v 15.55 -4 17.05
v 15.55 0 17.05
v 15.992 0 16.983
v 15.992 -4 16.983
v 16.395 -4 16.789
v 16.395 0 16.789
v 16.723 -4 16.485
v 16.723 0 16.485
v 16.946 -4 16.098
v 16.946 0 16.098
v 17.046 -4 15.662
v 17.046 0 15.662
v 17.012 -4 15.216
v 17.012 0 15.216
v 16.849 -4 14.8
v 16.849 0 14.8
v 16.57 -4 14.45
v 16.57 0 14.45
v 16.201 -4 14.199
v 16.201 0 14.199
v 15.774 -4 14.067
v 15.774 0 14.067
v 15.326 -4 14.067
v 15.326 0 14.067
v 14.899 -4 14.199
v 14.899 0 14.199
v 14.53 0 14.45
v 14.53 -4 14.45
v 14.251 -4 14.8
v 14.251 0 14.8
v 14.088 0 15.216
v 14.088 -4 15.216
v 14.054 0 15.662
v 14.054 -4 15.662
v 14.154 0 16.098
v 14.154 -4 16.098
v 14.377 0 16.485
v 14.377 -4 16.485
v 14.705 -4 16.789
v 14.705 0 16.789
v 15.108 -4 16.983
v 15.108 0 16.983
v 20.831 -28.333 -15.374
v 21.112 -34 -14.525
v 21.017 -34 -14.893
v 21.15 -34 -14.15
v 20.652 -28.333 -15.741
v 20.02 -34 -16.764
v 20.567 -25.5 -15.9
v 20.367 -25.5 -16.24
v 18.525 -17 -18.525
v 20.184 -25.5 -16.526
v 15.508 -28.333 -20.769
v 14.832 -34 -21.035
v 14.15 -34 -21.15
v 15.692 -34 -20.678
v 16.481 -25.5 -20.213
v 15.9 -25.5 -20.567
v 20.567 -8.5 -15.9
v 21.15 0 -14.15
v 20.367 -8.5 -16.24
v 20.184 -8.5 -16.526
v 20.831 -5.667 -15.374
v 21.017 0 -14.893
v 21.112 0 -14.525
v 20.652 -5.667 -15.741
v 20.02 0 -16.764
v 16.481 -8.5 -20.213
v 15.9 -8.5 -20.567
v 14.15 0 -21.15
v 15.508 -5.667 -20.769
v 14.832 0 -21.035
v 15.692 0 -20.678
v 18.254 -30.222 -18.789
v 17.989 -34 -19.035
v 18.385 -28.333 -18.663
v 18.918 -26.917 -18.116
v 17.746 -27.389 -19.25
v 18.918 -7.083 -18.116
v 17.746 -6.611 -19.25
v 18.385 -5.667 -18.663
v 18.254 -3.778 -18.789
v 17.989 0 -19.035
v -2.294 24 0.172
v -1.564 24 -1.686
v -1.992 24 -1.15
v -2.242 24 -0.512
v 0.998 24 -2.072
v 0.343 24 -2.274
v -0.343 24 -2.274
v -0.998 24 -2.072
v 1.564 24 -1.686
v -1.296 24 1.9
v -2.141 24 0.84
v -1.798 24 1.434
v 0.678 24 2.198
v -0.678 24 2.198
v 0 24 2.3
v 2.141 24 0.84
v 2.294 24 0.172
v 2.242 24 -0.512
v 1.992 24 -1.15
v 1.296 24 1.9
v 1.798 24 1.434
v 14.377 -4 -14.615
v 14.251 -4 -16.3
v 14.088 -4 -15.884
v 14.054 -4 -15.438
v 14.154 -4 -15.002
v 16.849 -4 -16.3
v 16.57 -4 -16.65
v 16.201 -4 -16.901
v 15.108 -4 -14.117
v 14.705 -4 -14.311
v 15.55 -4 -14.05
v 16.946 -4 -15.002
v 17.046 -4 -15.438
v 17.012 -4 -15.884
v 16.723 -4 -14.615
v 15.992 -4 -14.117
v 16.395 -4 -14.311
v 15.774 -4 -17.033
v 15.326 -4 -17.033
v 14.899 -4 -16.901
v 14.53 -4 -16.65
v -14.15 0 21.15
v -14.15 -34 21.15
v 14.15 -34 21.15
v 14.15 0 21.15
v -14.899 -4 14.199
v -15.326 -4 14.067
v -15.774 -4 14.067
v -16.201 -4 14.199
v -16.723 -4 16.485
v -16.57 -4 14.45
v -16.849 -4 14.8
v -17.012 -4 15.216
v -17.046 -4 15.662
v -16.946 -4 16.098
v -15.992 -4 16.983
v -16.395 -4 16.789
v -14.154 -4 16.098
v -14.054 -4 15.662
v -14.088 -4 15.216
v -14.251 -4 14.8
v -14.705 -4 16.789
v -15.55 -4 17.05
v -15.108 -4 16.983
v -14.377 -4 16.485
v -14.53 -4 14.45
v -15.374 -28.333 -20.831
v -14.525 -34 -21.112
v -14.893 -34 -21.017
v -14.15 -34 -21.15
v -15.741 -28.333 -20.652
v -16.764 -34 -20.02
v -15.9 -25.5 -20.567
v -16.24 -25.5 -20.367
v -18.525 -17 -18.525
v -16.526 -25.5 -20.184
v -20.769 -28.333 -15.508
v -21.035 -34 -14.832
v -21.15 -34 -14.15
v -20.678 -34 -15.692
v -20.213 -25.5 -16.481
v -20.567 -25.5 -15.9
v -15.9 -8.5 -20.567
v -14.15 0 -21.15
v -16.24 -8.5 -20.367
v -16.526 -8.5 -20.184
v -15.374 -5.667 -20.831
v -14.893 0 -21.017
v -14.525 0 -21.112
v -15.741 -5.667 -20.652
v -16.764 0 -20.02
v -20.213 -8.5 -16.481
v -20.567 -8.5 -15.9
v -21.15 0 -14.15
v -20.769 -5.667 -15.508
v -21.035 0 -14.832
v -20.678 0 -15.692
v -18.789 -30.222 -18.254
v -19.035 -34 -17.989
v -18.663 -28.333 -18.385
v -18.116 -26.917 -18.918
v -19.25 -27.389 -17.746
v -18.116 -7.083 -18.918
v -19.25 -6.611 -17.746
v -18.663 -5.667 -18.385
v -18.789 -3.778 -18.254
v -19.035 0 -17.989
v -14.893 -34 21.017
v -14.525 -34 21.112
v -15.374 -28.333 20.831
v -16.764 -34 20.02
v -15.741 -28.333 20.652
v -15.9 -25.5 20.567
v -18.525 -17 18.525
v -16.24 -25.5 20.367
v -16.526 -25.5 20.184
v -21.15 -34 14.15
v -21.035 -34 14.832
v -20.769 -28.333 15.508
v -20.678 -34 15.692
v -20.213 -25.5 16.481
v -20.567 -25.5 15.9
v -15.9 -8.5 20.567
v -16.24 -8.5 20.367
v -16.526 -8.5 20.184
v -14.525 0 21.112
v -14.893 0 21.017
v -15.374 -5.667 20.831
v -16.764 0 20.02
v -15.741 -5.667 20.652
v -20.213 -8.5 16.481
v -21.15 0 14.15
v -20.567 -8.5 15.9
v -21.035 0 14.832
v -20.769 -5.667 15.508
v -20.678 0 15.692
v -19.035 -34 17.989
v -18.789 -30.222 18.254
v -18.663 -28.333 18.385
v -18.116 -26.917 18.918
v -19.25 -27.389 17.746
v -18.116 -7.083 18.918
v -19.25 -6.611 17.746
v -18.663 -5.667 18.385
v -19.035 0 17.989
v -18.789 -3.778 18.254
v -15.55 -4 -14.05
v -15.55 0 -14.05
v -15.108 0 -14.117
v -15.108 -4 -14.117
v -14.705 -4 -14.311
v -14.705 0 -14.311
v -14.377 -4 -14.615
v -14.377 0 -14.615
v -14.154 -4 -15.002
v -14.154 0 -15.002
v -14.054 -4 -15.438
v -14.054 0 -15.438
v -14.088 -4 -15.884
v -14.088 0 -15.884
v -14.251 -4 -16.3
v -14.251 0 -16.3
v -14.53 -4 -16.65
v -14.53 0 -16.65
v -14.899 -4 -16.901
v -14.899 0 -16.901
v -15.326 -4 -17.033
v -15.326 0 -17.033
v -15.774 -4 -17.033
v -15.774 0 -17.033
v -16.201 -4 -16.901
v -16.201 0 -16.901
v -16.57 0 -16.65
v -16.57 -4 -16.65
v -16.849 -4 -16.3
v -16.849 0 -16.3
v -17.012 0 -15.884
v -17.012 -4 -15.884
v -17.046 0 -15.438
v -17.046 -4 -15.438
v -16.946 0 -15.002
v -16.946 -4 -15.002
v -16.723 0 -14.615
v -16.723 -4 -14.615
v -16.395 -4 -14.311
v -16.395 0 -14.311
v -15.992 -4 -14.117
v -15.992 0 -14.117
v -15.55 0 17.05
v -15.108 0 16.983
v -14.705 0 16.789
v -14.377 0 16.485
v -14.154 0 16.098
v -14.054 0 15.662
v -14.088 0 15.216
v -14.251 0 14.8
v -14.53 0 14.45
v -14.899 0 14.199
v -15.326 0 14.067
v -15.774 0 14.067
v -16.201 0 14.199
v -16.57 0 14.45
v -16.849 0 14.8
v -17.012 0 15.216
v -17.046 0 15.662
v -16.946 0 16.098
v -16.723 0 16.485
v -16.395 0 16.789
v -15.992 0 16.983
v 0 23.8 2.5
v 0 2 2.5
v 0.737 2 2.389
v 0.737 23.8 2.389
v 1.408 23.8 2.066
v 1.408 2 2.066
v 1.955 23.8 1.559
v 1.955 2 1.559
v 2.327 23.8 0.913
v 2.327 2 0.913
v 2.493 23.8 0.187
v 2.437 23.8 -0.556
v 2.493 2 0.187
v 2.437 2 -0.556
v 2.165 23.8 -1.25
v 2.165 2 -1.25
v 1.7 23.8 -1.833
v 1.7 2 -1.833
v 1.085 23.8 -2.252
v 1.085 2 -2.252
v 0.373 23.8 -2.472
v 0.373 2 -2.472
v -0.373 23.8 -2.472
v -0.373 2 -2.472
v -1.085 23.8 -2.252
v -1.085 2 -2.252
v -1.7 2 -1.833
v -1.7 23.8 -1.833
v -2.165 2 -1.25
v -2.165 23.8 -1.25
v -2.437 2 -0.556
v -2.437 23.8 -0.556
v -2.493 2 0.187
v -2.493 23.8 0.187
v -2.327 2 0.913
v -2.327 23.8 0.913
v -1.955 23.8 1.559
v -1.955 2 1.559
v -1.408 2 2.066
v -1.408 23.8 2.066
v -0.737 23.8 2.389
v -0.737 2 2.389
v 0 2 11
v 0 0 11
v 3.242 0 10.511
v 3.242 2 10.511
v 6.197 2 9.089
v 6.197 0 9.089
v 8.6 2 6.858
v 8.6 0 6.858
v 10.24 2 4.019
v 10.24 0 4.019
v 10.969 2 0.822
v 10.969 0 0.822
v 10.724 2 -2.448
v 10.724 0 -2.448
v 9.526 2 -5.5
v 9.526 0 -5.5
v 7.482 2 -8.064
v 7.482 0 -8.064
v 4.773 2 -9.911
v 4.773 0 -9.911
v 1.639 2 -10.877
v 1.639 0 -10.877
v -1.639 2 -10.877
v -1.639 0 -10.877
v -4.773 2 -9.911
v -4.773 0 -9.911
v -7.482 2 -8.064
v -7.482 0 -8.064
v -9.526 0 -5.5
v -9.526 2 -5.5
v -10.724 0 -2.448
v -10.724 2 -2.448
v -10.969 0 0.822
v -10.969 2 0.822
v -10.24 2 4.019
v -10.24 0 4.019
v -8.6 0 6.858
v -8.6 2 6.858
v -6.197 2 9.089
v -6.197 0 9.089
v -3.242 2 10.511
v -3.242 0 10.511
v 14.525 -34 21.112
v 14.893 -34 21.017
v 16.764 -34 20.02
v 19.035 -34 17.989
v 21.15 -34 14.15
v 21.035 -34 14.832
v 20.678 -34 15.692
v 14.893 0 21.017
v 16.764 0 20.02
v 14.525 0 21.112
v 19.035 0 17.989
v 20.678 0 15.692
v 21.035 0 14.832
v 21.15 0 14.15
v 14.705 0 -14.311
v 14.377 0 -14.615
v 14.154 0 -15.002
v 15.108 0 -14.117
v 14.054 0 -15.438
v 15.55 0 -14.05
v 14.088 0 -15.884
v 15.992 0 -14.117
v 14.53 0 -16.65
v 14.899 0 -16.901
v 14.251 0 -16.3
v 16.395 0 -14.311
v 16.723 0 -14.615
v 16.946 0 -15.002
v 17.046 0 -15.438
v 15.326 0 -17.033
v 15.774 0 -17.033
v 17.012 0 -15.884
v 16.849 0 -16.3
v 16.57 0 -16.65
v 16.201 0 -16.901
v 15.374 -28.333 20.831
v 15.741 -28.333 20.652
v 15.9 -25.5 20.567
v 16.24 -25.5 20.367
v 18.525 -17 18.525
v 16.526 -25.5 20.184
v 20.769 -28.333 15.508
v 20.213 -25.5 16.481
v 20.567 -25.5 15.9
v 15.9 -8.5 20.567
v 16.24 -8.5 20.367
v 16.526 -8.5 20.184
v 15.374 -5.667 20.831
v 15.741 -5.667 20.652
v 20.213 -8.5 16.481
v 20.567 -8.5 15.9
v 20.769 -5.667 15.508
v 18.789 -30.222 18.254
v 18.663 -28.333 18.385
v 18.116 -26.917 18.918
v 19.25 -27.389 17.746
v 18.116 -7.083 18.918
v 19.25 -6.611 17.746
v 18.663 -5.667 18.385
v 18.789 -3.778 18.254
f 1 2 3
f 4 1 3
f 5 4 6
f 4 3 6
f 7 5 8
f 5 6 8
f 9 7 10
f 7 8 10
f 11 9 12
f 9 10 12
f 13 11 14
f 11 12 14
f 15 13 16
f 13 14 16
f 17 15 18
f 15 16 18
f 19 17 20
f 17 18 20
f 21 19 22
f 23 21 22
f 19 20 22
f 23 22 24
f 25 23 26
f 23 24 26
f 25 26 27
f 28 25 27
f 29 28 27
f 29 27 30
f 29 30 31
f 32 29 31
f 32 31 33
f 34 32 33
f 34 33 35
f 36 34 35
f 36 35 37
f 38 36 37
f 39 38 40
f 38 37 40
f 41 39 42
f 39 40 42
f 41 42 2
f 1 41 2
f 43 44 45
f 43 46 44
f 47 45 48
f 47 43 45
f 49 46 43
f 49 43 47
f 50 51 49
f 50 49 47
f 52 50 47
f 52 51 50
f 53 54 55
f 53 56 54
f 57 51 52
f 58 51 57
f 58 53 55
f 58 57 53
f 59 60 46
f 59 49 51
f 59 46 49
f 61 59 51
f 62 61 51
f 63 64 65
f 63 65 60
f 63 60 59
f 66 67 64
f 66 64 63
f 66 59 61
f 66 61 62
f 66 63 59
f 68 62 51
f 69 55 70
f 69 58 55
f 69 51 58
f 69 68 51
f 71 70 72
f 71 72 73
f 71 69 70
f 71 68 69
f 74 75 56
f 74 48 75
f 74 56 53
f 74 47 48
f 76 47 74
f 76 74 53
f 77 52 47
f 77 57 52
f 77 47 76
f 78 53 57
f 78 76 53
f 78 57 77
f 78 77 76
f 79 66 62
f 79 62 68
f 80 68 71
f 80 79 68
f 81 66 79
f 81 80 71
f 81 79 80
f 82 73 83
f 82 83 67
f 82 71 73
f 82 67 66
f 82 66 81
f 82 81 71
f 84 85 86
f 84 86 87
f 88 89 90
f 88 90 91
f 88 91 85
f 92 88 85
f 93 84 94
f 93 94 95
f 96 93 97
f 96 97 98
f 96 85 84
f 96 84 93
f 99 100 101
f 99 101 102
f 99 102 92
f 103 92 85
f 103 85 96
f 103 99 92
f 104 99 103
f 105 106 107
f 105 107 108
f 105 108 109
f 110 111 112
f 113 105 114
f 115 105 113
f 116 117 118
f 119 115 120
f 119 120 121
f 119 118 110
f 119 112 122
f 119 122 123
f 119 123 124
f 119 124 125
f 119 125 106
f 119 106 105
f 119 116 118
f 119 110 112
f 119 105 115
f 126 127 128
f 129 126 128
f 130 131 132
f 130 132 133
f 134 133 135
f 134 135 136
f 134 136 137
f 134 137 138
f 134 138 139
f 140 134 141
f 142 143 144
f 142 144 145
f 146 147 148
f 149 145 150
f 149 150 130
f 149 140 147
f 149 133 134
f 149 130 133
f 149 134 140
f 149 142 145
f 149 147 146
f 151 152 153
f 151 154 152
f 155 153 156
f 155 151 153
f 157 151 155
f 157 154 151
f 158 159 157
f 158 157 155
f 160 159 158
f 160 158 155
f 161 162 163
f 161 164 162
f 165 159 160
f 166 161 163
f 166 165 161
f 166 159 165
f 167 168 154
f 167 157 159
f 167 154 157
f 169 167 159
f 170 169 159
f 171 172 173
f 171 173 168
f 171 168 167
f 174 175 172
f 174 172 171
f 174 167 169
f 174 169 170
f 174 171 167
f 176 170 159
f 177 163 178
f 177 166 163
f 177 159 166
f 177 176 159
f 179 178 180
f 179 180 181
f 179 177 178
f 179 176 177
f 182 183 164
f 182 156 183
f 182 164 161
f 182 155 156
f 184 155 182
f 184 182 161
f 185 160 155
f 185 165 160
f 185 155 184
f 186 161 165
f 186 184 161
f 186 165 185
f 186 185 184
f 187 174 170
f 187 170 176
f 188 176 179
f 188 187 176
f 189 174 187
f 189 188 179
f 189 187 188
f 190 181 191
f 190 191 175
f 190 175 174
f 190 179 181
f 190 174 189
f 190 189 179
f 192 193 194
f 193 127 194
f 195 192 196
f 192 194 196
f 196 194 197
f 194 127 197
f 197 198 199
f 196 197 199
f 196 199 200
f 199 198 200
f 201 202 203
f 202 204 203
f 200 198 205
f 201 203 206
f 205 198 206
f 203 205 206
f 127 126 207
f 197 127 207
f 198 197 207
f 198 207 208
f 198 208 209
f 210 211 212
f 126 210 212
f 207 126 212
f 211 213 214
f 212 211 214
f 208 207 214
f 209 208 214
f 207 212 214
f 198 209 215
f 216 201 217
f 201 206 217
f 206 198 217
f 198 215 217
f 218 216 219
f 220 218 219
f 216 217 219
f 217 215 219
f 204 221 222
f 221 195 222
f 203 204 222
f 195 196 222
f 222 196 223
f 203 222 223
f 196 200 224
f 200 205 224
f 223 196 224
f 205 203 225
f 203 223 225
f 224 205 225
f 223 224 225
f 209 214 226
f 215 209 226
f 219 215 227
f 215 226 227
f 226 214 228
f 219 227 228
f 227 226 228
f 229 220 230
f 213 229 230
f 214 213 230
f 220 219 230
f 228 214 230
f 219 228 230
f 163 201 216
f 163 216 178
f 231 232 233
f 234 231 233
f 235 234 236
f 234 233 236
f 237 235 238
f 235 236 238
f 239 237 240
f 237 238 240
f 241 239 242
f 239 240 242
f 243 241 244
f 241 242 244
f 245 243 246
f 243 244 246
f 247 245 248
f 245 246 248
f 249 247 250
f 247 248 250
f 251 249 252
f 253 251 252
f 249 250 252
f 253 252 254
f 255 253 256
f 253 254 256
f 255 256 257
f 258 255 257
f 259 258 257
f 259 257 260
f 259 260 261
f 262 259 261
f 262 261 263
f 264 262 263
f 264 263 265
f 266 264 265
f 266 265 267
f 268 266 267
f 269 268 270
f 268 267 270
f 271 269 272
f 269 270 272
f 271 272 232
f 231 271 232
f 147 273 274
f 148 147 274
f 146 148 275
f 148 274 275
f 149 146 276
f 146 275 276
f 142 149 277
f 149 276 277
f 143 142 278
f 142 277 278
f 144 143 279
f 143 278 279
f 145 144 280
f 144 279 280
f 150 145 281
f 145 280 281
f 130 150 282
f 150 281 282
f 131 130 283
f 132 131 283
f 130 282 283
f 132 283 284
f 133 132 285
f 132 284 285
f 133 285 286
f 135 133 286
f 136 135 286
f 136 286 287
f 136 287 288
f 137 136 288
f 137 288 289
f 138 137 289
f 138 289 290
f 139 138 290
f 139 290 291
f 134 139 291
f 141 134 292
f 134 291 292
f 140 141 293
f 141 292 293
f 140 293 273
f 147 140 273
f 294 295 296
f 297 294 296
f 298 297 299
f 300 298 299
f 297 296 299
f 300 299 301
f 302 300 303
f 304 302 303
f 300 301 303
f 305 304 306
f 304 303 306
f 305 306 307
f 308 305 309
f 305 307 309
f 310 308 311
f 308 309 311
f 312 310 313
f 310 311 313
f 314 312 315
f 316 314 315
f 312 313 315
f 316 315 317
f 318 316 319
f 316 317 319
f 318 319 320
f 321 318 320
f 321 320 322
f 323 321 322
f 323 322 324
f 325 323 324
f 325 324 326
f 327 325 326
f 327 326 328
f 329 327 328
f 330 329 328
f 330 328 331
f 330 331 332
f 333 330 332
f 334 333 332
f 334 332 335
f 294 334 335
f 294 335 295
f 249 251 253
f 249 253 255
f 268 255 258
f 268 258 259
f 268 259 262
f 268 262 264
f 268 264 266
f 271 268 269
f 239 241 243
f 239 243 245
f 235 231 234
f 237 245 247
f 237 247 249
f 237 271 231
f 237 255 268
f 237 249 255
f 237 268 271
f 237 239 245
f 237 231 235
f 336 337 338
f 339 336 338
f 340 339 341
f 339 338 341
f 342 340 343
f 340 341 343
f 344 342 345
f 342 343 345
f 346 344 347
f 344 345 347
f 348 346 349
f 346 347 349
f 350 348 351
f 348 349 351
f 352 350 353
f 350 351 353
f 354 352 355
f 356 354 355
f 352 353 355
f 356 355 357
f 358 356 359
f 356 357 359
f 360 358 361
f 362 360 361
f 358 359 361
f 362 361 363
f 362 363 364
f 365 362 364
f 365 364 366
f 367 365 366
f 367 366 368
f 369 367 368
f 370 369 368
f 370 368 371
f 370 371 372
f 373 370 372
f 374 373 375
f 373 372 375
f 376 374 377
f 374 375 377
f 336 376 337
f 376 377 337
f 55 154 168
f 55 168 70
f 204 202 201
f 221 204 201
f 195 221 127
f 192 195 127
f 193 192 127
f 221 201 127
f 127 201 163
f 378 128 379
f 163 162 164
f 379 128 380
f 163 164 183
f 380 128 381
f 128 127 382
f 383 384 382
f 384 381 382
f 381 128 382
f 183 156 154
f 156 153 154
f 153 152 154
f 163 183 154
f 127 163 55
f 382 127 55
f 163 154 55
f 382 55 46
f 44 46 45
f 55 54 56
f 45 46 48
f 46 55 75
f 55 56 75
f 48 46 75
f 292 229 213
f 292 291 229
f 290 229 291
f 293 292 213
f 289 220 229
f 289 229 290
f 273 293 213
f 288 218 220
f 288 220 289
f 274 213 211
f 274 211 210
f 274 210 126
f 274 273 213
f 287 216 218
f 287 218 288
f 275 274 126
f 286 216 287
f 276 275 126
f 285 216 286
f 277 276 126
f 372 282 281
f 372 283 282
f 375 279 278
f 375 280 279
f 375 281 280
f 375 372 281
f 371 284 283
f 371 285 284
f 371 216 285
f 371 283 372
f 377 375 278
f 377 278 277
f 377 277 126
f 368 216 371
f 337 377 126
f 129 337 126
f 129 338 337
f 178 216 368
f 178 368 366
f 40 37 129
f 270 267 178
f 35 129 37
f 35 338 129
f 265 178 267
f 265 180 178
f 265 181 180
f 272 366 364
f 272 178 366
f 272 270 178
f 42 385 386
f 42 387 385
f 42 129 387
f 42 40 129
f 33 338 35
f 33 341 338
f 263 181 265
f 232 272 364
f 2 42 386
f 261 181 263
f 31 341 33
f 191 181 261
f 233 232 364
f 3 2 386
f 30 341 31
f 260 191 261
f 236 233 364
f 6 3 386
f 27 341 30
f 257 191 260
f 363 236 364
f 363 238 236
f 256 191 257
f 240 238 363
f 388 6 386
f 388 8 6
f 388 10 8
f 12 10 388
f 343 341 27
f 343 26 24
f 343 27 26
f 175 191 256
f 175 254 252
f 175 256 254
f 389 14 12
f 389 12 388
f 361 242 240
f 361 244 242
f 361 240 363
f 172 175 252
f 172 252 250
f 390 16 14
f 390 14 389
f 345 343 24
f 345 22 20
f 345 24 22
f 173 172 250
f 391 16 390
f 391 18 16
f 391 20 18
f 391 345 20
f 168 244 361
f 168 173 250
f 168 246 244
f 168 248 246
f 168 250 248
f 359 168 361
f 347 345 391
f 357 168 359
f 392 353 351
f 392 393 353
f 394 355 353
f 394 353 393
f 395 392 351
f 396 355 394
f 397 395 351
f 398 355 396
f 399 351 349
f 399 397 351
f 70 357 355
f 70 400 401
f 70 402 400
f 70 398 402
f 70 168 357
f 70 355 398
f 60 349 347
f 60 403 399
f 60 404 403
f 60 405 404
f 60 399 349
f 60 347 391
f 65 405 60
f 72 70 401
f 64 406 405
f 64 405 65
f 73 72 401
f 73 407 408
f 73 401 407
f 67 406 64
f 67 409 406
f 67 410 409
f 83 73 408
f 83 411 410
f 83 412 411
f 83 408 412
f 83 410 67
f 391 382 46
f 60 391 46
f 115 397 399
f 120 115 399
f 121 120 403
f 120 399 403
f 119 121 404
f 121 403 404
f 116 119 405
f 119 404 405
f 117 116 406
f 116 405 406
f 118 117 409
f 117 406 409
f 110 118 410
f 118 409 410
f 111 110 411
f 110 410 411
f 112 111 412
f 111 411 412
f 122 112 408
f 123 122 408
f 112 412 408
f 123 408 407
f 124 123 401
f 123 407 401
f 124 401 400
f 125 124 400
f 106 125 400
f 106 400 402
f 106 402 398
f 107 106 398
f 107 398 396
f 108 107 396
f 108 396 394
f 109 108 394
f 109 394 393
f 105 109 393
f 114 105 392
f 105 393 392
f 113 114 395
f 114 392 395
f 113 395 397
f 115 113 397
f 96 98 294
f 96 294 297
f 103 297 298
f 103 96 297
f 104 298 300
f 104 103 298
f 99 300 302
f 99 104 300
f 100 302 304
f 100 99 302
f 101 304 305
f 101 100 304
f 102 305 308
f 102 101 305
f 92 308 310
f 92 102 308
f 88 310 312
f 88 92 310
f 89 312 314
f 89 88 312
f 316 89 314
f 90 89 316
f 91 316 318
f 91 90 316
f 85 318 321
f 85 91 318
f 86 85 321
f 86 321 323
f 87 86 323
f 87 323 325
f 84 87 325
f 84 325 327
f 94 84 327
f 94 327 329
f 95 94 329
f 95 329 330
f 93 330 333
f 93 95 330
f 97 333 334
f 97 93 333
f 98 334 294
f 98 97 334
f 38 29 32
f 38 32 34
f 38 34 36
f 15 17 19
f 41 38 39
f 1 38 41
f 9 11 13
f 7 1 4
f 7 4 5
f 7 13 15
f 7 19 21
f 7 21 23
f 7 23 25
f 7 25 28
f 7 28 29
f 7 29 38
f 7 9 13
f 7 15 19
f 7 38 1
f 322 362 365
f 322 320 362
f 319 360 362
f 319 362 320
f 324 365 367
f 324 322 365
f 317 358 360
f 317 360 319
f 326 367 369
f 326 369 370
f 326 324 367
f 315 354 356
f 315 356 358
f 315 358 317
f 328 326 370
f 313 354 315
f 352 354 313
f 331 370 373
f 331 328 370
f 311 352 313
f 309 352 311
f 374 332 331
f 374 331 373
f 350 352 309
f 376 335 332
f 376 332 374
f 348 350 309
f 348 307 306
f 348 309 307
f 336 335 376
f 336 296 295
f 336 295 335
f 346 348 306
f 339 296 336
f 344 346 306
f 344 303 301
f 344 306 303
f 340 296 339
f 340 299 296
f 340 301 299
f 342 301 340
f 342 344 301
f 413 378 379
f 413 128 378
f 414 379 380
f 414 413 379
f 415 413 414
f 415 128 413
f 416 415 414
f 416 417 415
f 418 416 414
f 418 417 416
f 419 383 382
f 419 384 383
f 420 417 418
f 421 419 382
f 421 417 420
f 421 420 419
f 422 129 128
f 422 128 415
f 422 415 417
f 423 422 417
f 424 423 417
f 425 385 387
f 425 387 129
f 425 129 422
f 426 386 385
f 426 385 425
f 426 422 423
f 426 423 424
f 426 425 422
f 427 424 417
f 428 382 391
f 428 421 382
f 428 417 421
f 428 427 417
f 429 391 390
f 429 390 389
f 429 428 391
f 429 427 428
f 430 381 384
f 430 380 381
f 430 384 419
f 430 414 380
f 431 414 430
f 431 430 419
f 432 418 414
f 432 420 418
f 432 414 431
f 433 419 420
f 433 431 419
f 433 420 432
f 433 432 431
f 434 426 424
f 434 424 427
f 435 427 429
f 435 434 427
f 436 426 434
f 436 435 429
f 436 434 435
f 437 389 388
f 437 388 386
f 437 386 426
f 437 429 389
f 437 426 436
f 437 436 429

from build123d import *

# Parameters (mm, degrees)
SKETCH1_W           = 42.3
SKETCH1_H           = 42.3
BOSS_EXTRUDE1_DEPTH = 34
FILLET1_SIZE        = 7
SKETCH1_3_R         = 1.5
CUT_EXTRUDE1_DEPTH  = 4
SKETCH3_R           = 11
SKETCH3_R_2         = 2.5
BOSS_EXTRUDE2_DEPTH = 2
SKETCH3_2_R         = 2.5
BOSS_EXTRUDE3_DEPTH = 24
CHAMFER1_SIZE       = 0.2


with BuildPart() as part:
    # Sketch1 → Boss-Extrude1 (new body)
    with BuildSketch(Plane(origin=(0, 0, 0), x_dir=(1, 0, 0), z_dir=(0, 1, 0))):
        Rectangle(SKETCH1_W, SKETCH1_H)
    extrude(amount=-BOSS_EXTRUDE1_DEPTH)

    # Fillet1
    # a fillet whose section is not a circle: 7 mm, written as the material it takes off along each edge
    with BuildSketch(Plane(origin=(21.15, 17.5, 21.15), x_dir=(-1, 0, 0), z_dir=(0, -1, 0)), Plane(origin=(21.15, 17.5, -21.15), x_dir=(0, 0, 1), z_dir=(0, -1, 0)), Plane(origin=(-21.15, 17.5, -21.15), x_dir=(1, 0, 0), z_dir=(0, -1, 0))) as fillet1_piece_1:
        with BuildLine():
            Bezier((FILLET1_SIZE, 0), (0, 0), (0, FILLET1_SIZE), weights=[1, 0.333333333, 1])
            Line((0, FILLET1_SIZE), (0, 0))
            Line((0, 0), (FILLET1_SIZE, 0))
        make_face()
    extrude(amount=69, mode=Mode.SUBTRACT)
    with BuildSketch(Plane(origin=(-21.15, 17.5, 21.15), x_dir=(1, 0, 0), z_dir=(0, -1, 0))) as fillet1_piece_2:
        with BuildLine():
            Bezier((FILLET1_SIZE, 0), (0, 0), (0, -FILLET1_SIZE), weights=[1, 0.333333333, 1])
            Line((0, -FILLET1_SIZE), (0, 0))
            Line((0, 0), (FILLET1_SIZE, 0))
        make_face()
    extrude(amount=69, mode=Mode.SUBTRACT)

    # Sketch1<3> → Cut-Extrude1 (cut)
    with BuildSketch(Plane(origin=(0, 0, 0), x_dir=(1, 0, 0), z_dir=(0, 1, 0))):
        with Locations(Location((-15.55, -15.55, 0), (0, 0, 270))):
            Circle(SKETCH1_3_R)
        with Locations(Location((-15.55, 15.55, 0), (0, 0, 270))):
            Circle(SKETCH1_3_R)
        with Locations(Location((15.55, 15.55, 0), (0, 0, 270))):
            Circle(SKETCH1_3_R)
        with Locations(Location((15.55, -15.55, 0), (0, 0, 270))):
            Circle(SKETCH1_3_R)
    extrude(amount=-CUT_EXTRUDE1_DEPTH, mode=Mode.SUBTRACT)

    # Sketch3 → Boss-Extrude2 (add)
    with BuildSketch(Plane(origin=(0, 0, 0), x_dir=(1, 0, 0), z_dir=(0, 1, 0))):
        with Locations(Location((0, 0, 0), (0, 0, 270))):
            Circle(SKETCH3_R)
        with Locations(Location((0, 0, 0), (0, 0, 270))):
            Circle(SKETCH3_R_2, mode=Mode.SUBTRACT)
    extrude(amount=BOSS_EXTRUDE2_DEPTH)

    # Sketch3<2> → Boss-Extrude3 (add)
    with BuildSketch(Plane(origin=(0, 0, 0), x_dir=(1, 0, 0), z_dir=(0, 1, 0))):
        with Locations(Location((0, 0, 0), (0, 0, 270))):
            Circle(SKETCH3_2_R)
    extrude(amount=BOSS_EXTRUDE3_DEPTH)

    # Chamfer1
    chamfer1_edges = [part.edges().sort_by_distance(p)[0] for p in [
        (0, 24, -2.5),
    ]]
    chamfer(chamfer1_edges, length=CHAMFER1_SIZE)


solid = part.part
